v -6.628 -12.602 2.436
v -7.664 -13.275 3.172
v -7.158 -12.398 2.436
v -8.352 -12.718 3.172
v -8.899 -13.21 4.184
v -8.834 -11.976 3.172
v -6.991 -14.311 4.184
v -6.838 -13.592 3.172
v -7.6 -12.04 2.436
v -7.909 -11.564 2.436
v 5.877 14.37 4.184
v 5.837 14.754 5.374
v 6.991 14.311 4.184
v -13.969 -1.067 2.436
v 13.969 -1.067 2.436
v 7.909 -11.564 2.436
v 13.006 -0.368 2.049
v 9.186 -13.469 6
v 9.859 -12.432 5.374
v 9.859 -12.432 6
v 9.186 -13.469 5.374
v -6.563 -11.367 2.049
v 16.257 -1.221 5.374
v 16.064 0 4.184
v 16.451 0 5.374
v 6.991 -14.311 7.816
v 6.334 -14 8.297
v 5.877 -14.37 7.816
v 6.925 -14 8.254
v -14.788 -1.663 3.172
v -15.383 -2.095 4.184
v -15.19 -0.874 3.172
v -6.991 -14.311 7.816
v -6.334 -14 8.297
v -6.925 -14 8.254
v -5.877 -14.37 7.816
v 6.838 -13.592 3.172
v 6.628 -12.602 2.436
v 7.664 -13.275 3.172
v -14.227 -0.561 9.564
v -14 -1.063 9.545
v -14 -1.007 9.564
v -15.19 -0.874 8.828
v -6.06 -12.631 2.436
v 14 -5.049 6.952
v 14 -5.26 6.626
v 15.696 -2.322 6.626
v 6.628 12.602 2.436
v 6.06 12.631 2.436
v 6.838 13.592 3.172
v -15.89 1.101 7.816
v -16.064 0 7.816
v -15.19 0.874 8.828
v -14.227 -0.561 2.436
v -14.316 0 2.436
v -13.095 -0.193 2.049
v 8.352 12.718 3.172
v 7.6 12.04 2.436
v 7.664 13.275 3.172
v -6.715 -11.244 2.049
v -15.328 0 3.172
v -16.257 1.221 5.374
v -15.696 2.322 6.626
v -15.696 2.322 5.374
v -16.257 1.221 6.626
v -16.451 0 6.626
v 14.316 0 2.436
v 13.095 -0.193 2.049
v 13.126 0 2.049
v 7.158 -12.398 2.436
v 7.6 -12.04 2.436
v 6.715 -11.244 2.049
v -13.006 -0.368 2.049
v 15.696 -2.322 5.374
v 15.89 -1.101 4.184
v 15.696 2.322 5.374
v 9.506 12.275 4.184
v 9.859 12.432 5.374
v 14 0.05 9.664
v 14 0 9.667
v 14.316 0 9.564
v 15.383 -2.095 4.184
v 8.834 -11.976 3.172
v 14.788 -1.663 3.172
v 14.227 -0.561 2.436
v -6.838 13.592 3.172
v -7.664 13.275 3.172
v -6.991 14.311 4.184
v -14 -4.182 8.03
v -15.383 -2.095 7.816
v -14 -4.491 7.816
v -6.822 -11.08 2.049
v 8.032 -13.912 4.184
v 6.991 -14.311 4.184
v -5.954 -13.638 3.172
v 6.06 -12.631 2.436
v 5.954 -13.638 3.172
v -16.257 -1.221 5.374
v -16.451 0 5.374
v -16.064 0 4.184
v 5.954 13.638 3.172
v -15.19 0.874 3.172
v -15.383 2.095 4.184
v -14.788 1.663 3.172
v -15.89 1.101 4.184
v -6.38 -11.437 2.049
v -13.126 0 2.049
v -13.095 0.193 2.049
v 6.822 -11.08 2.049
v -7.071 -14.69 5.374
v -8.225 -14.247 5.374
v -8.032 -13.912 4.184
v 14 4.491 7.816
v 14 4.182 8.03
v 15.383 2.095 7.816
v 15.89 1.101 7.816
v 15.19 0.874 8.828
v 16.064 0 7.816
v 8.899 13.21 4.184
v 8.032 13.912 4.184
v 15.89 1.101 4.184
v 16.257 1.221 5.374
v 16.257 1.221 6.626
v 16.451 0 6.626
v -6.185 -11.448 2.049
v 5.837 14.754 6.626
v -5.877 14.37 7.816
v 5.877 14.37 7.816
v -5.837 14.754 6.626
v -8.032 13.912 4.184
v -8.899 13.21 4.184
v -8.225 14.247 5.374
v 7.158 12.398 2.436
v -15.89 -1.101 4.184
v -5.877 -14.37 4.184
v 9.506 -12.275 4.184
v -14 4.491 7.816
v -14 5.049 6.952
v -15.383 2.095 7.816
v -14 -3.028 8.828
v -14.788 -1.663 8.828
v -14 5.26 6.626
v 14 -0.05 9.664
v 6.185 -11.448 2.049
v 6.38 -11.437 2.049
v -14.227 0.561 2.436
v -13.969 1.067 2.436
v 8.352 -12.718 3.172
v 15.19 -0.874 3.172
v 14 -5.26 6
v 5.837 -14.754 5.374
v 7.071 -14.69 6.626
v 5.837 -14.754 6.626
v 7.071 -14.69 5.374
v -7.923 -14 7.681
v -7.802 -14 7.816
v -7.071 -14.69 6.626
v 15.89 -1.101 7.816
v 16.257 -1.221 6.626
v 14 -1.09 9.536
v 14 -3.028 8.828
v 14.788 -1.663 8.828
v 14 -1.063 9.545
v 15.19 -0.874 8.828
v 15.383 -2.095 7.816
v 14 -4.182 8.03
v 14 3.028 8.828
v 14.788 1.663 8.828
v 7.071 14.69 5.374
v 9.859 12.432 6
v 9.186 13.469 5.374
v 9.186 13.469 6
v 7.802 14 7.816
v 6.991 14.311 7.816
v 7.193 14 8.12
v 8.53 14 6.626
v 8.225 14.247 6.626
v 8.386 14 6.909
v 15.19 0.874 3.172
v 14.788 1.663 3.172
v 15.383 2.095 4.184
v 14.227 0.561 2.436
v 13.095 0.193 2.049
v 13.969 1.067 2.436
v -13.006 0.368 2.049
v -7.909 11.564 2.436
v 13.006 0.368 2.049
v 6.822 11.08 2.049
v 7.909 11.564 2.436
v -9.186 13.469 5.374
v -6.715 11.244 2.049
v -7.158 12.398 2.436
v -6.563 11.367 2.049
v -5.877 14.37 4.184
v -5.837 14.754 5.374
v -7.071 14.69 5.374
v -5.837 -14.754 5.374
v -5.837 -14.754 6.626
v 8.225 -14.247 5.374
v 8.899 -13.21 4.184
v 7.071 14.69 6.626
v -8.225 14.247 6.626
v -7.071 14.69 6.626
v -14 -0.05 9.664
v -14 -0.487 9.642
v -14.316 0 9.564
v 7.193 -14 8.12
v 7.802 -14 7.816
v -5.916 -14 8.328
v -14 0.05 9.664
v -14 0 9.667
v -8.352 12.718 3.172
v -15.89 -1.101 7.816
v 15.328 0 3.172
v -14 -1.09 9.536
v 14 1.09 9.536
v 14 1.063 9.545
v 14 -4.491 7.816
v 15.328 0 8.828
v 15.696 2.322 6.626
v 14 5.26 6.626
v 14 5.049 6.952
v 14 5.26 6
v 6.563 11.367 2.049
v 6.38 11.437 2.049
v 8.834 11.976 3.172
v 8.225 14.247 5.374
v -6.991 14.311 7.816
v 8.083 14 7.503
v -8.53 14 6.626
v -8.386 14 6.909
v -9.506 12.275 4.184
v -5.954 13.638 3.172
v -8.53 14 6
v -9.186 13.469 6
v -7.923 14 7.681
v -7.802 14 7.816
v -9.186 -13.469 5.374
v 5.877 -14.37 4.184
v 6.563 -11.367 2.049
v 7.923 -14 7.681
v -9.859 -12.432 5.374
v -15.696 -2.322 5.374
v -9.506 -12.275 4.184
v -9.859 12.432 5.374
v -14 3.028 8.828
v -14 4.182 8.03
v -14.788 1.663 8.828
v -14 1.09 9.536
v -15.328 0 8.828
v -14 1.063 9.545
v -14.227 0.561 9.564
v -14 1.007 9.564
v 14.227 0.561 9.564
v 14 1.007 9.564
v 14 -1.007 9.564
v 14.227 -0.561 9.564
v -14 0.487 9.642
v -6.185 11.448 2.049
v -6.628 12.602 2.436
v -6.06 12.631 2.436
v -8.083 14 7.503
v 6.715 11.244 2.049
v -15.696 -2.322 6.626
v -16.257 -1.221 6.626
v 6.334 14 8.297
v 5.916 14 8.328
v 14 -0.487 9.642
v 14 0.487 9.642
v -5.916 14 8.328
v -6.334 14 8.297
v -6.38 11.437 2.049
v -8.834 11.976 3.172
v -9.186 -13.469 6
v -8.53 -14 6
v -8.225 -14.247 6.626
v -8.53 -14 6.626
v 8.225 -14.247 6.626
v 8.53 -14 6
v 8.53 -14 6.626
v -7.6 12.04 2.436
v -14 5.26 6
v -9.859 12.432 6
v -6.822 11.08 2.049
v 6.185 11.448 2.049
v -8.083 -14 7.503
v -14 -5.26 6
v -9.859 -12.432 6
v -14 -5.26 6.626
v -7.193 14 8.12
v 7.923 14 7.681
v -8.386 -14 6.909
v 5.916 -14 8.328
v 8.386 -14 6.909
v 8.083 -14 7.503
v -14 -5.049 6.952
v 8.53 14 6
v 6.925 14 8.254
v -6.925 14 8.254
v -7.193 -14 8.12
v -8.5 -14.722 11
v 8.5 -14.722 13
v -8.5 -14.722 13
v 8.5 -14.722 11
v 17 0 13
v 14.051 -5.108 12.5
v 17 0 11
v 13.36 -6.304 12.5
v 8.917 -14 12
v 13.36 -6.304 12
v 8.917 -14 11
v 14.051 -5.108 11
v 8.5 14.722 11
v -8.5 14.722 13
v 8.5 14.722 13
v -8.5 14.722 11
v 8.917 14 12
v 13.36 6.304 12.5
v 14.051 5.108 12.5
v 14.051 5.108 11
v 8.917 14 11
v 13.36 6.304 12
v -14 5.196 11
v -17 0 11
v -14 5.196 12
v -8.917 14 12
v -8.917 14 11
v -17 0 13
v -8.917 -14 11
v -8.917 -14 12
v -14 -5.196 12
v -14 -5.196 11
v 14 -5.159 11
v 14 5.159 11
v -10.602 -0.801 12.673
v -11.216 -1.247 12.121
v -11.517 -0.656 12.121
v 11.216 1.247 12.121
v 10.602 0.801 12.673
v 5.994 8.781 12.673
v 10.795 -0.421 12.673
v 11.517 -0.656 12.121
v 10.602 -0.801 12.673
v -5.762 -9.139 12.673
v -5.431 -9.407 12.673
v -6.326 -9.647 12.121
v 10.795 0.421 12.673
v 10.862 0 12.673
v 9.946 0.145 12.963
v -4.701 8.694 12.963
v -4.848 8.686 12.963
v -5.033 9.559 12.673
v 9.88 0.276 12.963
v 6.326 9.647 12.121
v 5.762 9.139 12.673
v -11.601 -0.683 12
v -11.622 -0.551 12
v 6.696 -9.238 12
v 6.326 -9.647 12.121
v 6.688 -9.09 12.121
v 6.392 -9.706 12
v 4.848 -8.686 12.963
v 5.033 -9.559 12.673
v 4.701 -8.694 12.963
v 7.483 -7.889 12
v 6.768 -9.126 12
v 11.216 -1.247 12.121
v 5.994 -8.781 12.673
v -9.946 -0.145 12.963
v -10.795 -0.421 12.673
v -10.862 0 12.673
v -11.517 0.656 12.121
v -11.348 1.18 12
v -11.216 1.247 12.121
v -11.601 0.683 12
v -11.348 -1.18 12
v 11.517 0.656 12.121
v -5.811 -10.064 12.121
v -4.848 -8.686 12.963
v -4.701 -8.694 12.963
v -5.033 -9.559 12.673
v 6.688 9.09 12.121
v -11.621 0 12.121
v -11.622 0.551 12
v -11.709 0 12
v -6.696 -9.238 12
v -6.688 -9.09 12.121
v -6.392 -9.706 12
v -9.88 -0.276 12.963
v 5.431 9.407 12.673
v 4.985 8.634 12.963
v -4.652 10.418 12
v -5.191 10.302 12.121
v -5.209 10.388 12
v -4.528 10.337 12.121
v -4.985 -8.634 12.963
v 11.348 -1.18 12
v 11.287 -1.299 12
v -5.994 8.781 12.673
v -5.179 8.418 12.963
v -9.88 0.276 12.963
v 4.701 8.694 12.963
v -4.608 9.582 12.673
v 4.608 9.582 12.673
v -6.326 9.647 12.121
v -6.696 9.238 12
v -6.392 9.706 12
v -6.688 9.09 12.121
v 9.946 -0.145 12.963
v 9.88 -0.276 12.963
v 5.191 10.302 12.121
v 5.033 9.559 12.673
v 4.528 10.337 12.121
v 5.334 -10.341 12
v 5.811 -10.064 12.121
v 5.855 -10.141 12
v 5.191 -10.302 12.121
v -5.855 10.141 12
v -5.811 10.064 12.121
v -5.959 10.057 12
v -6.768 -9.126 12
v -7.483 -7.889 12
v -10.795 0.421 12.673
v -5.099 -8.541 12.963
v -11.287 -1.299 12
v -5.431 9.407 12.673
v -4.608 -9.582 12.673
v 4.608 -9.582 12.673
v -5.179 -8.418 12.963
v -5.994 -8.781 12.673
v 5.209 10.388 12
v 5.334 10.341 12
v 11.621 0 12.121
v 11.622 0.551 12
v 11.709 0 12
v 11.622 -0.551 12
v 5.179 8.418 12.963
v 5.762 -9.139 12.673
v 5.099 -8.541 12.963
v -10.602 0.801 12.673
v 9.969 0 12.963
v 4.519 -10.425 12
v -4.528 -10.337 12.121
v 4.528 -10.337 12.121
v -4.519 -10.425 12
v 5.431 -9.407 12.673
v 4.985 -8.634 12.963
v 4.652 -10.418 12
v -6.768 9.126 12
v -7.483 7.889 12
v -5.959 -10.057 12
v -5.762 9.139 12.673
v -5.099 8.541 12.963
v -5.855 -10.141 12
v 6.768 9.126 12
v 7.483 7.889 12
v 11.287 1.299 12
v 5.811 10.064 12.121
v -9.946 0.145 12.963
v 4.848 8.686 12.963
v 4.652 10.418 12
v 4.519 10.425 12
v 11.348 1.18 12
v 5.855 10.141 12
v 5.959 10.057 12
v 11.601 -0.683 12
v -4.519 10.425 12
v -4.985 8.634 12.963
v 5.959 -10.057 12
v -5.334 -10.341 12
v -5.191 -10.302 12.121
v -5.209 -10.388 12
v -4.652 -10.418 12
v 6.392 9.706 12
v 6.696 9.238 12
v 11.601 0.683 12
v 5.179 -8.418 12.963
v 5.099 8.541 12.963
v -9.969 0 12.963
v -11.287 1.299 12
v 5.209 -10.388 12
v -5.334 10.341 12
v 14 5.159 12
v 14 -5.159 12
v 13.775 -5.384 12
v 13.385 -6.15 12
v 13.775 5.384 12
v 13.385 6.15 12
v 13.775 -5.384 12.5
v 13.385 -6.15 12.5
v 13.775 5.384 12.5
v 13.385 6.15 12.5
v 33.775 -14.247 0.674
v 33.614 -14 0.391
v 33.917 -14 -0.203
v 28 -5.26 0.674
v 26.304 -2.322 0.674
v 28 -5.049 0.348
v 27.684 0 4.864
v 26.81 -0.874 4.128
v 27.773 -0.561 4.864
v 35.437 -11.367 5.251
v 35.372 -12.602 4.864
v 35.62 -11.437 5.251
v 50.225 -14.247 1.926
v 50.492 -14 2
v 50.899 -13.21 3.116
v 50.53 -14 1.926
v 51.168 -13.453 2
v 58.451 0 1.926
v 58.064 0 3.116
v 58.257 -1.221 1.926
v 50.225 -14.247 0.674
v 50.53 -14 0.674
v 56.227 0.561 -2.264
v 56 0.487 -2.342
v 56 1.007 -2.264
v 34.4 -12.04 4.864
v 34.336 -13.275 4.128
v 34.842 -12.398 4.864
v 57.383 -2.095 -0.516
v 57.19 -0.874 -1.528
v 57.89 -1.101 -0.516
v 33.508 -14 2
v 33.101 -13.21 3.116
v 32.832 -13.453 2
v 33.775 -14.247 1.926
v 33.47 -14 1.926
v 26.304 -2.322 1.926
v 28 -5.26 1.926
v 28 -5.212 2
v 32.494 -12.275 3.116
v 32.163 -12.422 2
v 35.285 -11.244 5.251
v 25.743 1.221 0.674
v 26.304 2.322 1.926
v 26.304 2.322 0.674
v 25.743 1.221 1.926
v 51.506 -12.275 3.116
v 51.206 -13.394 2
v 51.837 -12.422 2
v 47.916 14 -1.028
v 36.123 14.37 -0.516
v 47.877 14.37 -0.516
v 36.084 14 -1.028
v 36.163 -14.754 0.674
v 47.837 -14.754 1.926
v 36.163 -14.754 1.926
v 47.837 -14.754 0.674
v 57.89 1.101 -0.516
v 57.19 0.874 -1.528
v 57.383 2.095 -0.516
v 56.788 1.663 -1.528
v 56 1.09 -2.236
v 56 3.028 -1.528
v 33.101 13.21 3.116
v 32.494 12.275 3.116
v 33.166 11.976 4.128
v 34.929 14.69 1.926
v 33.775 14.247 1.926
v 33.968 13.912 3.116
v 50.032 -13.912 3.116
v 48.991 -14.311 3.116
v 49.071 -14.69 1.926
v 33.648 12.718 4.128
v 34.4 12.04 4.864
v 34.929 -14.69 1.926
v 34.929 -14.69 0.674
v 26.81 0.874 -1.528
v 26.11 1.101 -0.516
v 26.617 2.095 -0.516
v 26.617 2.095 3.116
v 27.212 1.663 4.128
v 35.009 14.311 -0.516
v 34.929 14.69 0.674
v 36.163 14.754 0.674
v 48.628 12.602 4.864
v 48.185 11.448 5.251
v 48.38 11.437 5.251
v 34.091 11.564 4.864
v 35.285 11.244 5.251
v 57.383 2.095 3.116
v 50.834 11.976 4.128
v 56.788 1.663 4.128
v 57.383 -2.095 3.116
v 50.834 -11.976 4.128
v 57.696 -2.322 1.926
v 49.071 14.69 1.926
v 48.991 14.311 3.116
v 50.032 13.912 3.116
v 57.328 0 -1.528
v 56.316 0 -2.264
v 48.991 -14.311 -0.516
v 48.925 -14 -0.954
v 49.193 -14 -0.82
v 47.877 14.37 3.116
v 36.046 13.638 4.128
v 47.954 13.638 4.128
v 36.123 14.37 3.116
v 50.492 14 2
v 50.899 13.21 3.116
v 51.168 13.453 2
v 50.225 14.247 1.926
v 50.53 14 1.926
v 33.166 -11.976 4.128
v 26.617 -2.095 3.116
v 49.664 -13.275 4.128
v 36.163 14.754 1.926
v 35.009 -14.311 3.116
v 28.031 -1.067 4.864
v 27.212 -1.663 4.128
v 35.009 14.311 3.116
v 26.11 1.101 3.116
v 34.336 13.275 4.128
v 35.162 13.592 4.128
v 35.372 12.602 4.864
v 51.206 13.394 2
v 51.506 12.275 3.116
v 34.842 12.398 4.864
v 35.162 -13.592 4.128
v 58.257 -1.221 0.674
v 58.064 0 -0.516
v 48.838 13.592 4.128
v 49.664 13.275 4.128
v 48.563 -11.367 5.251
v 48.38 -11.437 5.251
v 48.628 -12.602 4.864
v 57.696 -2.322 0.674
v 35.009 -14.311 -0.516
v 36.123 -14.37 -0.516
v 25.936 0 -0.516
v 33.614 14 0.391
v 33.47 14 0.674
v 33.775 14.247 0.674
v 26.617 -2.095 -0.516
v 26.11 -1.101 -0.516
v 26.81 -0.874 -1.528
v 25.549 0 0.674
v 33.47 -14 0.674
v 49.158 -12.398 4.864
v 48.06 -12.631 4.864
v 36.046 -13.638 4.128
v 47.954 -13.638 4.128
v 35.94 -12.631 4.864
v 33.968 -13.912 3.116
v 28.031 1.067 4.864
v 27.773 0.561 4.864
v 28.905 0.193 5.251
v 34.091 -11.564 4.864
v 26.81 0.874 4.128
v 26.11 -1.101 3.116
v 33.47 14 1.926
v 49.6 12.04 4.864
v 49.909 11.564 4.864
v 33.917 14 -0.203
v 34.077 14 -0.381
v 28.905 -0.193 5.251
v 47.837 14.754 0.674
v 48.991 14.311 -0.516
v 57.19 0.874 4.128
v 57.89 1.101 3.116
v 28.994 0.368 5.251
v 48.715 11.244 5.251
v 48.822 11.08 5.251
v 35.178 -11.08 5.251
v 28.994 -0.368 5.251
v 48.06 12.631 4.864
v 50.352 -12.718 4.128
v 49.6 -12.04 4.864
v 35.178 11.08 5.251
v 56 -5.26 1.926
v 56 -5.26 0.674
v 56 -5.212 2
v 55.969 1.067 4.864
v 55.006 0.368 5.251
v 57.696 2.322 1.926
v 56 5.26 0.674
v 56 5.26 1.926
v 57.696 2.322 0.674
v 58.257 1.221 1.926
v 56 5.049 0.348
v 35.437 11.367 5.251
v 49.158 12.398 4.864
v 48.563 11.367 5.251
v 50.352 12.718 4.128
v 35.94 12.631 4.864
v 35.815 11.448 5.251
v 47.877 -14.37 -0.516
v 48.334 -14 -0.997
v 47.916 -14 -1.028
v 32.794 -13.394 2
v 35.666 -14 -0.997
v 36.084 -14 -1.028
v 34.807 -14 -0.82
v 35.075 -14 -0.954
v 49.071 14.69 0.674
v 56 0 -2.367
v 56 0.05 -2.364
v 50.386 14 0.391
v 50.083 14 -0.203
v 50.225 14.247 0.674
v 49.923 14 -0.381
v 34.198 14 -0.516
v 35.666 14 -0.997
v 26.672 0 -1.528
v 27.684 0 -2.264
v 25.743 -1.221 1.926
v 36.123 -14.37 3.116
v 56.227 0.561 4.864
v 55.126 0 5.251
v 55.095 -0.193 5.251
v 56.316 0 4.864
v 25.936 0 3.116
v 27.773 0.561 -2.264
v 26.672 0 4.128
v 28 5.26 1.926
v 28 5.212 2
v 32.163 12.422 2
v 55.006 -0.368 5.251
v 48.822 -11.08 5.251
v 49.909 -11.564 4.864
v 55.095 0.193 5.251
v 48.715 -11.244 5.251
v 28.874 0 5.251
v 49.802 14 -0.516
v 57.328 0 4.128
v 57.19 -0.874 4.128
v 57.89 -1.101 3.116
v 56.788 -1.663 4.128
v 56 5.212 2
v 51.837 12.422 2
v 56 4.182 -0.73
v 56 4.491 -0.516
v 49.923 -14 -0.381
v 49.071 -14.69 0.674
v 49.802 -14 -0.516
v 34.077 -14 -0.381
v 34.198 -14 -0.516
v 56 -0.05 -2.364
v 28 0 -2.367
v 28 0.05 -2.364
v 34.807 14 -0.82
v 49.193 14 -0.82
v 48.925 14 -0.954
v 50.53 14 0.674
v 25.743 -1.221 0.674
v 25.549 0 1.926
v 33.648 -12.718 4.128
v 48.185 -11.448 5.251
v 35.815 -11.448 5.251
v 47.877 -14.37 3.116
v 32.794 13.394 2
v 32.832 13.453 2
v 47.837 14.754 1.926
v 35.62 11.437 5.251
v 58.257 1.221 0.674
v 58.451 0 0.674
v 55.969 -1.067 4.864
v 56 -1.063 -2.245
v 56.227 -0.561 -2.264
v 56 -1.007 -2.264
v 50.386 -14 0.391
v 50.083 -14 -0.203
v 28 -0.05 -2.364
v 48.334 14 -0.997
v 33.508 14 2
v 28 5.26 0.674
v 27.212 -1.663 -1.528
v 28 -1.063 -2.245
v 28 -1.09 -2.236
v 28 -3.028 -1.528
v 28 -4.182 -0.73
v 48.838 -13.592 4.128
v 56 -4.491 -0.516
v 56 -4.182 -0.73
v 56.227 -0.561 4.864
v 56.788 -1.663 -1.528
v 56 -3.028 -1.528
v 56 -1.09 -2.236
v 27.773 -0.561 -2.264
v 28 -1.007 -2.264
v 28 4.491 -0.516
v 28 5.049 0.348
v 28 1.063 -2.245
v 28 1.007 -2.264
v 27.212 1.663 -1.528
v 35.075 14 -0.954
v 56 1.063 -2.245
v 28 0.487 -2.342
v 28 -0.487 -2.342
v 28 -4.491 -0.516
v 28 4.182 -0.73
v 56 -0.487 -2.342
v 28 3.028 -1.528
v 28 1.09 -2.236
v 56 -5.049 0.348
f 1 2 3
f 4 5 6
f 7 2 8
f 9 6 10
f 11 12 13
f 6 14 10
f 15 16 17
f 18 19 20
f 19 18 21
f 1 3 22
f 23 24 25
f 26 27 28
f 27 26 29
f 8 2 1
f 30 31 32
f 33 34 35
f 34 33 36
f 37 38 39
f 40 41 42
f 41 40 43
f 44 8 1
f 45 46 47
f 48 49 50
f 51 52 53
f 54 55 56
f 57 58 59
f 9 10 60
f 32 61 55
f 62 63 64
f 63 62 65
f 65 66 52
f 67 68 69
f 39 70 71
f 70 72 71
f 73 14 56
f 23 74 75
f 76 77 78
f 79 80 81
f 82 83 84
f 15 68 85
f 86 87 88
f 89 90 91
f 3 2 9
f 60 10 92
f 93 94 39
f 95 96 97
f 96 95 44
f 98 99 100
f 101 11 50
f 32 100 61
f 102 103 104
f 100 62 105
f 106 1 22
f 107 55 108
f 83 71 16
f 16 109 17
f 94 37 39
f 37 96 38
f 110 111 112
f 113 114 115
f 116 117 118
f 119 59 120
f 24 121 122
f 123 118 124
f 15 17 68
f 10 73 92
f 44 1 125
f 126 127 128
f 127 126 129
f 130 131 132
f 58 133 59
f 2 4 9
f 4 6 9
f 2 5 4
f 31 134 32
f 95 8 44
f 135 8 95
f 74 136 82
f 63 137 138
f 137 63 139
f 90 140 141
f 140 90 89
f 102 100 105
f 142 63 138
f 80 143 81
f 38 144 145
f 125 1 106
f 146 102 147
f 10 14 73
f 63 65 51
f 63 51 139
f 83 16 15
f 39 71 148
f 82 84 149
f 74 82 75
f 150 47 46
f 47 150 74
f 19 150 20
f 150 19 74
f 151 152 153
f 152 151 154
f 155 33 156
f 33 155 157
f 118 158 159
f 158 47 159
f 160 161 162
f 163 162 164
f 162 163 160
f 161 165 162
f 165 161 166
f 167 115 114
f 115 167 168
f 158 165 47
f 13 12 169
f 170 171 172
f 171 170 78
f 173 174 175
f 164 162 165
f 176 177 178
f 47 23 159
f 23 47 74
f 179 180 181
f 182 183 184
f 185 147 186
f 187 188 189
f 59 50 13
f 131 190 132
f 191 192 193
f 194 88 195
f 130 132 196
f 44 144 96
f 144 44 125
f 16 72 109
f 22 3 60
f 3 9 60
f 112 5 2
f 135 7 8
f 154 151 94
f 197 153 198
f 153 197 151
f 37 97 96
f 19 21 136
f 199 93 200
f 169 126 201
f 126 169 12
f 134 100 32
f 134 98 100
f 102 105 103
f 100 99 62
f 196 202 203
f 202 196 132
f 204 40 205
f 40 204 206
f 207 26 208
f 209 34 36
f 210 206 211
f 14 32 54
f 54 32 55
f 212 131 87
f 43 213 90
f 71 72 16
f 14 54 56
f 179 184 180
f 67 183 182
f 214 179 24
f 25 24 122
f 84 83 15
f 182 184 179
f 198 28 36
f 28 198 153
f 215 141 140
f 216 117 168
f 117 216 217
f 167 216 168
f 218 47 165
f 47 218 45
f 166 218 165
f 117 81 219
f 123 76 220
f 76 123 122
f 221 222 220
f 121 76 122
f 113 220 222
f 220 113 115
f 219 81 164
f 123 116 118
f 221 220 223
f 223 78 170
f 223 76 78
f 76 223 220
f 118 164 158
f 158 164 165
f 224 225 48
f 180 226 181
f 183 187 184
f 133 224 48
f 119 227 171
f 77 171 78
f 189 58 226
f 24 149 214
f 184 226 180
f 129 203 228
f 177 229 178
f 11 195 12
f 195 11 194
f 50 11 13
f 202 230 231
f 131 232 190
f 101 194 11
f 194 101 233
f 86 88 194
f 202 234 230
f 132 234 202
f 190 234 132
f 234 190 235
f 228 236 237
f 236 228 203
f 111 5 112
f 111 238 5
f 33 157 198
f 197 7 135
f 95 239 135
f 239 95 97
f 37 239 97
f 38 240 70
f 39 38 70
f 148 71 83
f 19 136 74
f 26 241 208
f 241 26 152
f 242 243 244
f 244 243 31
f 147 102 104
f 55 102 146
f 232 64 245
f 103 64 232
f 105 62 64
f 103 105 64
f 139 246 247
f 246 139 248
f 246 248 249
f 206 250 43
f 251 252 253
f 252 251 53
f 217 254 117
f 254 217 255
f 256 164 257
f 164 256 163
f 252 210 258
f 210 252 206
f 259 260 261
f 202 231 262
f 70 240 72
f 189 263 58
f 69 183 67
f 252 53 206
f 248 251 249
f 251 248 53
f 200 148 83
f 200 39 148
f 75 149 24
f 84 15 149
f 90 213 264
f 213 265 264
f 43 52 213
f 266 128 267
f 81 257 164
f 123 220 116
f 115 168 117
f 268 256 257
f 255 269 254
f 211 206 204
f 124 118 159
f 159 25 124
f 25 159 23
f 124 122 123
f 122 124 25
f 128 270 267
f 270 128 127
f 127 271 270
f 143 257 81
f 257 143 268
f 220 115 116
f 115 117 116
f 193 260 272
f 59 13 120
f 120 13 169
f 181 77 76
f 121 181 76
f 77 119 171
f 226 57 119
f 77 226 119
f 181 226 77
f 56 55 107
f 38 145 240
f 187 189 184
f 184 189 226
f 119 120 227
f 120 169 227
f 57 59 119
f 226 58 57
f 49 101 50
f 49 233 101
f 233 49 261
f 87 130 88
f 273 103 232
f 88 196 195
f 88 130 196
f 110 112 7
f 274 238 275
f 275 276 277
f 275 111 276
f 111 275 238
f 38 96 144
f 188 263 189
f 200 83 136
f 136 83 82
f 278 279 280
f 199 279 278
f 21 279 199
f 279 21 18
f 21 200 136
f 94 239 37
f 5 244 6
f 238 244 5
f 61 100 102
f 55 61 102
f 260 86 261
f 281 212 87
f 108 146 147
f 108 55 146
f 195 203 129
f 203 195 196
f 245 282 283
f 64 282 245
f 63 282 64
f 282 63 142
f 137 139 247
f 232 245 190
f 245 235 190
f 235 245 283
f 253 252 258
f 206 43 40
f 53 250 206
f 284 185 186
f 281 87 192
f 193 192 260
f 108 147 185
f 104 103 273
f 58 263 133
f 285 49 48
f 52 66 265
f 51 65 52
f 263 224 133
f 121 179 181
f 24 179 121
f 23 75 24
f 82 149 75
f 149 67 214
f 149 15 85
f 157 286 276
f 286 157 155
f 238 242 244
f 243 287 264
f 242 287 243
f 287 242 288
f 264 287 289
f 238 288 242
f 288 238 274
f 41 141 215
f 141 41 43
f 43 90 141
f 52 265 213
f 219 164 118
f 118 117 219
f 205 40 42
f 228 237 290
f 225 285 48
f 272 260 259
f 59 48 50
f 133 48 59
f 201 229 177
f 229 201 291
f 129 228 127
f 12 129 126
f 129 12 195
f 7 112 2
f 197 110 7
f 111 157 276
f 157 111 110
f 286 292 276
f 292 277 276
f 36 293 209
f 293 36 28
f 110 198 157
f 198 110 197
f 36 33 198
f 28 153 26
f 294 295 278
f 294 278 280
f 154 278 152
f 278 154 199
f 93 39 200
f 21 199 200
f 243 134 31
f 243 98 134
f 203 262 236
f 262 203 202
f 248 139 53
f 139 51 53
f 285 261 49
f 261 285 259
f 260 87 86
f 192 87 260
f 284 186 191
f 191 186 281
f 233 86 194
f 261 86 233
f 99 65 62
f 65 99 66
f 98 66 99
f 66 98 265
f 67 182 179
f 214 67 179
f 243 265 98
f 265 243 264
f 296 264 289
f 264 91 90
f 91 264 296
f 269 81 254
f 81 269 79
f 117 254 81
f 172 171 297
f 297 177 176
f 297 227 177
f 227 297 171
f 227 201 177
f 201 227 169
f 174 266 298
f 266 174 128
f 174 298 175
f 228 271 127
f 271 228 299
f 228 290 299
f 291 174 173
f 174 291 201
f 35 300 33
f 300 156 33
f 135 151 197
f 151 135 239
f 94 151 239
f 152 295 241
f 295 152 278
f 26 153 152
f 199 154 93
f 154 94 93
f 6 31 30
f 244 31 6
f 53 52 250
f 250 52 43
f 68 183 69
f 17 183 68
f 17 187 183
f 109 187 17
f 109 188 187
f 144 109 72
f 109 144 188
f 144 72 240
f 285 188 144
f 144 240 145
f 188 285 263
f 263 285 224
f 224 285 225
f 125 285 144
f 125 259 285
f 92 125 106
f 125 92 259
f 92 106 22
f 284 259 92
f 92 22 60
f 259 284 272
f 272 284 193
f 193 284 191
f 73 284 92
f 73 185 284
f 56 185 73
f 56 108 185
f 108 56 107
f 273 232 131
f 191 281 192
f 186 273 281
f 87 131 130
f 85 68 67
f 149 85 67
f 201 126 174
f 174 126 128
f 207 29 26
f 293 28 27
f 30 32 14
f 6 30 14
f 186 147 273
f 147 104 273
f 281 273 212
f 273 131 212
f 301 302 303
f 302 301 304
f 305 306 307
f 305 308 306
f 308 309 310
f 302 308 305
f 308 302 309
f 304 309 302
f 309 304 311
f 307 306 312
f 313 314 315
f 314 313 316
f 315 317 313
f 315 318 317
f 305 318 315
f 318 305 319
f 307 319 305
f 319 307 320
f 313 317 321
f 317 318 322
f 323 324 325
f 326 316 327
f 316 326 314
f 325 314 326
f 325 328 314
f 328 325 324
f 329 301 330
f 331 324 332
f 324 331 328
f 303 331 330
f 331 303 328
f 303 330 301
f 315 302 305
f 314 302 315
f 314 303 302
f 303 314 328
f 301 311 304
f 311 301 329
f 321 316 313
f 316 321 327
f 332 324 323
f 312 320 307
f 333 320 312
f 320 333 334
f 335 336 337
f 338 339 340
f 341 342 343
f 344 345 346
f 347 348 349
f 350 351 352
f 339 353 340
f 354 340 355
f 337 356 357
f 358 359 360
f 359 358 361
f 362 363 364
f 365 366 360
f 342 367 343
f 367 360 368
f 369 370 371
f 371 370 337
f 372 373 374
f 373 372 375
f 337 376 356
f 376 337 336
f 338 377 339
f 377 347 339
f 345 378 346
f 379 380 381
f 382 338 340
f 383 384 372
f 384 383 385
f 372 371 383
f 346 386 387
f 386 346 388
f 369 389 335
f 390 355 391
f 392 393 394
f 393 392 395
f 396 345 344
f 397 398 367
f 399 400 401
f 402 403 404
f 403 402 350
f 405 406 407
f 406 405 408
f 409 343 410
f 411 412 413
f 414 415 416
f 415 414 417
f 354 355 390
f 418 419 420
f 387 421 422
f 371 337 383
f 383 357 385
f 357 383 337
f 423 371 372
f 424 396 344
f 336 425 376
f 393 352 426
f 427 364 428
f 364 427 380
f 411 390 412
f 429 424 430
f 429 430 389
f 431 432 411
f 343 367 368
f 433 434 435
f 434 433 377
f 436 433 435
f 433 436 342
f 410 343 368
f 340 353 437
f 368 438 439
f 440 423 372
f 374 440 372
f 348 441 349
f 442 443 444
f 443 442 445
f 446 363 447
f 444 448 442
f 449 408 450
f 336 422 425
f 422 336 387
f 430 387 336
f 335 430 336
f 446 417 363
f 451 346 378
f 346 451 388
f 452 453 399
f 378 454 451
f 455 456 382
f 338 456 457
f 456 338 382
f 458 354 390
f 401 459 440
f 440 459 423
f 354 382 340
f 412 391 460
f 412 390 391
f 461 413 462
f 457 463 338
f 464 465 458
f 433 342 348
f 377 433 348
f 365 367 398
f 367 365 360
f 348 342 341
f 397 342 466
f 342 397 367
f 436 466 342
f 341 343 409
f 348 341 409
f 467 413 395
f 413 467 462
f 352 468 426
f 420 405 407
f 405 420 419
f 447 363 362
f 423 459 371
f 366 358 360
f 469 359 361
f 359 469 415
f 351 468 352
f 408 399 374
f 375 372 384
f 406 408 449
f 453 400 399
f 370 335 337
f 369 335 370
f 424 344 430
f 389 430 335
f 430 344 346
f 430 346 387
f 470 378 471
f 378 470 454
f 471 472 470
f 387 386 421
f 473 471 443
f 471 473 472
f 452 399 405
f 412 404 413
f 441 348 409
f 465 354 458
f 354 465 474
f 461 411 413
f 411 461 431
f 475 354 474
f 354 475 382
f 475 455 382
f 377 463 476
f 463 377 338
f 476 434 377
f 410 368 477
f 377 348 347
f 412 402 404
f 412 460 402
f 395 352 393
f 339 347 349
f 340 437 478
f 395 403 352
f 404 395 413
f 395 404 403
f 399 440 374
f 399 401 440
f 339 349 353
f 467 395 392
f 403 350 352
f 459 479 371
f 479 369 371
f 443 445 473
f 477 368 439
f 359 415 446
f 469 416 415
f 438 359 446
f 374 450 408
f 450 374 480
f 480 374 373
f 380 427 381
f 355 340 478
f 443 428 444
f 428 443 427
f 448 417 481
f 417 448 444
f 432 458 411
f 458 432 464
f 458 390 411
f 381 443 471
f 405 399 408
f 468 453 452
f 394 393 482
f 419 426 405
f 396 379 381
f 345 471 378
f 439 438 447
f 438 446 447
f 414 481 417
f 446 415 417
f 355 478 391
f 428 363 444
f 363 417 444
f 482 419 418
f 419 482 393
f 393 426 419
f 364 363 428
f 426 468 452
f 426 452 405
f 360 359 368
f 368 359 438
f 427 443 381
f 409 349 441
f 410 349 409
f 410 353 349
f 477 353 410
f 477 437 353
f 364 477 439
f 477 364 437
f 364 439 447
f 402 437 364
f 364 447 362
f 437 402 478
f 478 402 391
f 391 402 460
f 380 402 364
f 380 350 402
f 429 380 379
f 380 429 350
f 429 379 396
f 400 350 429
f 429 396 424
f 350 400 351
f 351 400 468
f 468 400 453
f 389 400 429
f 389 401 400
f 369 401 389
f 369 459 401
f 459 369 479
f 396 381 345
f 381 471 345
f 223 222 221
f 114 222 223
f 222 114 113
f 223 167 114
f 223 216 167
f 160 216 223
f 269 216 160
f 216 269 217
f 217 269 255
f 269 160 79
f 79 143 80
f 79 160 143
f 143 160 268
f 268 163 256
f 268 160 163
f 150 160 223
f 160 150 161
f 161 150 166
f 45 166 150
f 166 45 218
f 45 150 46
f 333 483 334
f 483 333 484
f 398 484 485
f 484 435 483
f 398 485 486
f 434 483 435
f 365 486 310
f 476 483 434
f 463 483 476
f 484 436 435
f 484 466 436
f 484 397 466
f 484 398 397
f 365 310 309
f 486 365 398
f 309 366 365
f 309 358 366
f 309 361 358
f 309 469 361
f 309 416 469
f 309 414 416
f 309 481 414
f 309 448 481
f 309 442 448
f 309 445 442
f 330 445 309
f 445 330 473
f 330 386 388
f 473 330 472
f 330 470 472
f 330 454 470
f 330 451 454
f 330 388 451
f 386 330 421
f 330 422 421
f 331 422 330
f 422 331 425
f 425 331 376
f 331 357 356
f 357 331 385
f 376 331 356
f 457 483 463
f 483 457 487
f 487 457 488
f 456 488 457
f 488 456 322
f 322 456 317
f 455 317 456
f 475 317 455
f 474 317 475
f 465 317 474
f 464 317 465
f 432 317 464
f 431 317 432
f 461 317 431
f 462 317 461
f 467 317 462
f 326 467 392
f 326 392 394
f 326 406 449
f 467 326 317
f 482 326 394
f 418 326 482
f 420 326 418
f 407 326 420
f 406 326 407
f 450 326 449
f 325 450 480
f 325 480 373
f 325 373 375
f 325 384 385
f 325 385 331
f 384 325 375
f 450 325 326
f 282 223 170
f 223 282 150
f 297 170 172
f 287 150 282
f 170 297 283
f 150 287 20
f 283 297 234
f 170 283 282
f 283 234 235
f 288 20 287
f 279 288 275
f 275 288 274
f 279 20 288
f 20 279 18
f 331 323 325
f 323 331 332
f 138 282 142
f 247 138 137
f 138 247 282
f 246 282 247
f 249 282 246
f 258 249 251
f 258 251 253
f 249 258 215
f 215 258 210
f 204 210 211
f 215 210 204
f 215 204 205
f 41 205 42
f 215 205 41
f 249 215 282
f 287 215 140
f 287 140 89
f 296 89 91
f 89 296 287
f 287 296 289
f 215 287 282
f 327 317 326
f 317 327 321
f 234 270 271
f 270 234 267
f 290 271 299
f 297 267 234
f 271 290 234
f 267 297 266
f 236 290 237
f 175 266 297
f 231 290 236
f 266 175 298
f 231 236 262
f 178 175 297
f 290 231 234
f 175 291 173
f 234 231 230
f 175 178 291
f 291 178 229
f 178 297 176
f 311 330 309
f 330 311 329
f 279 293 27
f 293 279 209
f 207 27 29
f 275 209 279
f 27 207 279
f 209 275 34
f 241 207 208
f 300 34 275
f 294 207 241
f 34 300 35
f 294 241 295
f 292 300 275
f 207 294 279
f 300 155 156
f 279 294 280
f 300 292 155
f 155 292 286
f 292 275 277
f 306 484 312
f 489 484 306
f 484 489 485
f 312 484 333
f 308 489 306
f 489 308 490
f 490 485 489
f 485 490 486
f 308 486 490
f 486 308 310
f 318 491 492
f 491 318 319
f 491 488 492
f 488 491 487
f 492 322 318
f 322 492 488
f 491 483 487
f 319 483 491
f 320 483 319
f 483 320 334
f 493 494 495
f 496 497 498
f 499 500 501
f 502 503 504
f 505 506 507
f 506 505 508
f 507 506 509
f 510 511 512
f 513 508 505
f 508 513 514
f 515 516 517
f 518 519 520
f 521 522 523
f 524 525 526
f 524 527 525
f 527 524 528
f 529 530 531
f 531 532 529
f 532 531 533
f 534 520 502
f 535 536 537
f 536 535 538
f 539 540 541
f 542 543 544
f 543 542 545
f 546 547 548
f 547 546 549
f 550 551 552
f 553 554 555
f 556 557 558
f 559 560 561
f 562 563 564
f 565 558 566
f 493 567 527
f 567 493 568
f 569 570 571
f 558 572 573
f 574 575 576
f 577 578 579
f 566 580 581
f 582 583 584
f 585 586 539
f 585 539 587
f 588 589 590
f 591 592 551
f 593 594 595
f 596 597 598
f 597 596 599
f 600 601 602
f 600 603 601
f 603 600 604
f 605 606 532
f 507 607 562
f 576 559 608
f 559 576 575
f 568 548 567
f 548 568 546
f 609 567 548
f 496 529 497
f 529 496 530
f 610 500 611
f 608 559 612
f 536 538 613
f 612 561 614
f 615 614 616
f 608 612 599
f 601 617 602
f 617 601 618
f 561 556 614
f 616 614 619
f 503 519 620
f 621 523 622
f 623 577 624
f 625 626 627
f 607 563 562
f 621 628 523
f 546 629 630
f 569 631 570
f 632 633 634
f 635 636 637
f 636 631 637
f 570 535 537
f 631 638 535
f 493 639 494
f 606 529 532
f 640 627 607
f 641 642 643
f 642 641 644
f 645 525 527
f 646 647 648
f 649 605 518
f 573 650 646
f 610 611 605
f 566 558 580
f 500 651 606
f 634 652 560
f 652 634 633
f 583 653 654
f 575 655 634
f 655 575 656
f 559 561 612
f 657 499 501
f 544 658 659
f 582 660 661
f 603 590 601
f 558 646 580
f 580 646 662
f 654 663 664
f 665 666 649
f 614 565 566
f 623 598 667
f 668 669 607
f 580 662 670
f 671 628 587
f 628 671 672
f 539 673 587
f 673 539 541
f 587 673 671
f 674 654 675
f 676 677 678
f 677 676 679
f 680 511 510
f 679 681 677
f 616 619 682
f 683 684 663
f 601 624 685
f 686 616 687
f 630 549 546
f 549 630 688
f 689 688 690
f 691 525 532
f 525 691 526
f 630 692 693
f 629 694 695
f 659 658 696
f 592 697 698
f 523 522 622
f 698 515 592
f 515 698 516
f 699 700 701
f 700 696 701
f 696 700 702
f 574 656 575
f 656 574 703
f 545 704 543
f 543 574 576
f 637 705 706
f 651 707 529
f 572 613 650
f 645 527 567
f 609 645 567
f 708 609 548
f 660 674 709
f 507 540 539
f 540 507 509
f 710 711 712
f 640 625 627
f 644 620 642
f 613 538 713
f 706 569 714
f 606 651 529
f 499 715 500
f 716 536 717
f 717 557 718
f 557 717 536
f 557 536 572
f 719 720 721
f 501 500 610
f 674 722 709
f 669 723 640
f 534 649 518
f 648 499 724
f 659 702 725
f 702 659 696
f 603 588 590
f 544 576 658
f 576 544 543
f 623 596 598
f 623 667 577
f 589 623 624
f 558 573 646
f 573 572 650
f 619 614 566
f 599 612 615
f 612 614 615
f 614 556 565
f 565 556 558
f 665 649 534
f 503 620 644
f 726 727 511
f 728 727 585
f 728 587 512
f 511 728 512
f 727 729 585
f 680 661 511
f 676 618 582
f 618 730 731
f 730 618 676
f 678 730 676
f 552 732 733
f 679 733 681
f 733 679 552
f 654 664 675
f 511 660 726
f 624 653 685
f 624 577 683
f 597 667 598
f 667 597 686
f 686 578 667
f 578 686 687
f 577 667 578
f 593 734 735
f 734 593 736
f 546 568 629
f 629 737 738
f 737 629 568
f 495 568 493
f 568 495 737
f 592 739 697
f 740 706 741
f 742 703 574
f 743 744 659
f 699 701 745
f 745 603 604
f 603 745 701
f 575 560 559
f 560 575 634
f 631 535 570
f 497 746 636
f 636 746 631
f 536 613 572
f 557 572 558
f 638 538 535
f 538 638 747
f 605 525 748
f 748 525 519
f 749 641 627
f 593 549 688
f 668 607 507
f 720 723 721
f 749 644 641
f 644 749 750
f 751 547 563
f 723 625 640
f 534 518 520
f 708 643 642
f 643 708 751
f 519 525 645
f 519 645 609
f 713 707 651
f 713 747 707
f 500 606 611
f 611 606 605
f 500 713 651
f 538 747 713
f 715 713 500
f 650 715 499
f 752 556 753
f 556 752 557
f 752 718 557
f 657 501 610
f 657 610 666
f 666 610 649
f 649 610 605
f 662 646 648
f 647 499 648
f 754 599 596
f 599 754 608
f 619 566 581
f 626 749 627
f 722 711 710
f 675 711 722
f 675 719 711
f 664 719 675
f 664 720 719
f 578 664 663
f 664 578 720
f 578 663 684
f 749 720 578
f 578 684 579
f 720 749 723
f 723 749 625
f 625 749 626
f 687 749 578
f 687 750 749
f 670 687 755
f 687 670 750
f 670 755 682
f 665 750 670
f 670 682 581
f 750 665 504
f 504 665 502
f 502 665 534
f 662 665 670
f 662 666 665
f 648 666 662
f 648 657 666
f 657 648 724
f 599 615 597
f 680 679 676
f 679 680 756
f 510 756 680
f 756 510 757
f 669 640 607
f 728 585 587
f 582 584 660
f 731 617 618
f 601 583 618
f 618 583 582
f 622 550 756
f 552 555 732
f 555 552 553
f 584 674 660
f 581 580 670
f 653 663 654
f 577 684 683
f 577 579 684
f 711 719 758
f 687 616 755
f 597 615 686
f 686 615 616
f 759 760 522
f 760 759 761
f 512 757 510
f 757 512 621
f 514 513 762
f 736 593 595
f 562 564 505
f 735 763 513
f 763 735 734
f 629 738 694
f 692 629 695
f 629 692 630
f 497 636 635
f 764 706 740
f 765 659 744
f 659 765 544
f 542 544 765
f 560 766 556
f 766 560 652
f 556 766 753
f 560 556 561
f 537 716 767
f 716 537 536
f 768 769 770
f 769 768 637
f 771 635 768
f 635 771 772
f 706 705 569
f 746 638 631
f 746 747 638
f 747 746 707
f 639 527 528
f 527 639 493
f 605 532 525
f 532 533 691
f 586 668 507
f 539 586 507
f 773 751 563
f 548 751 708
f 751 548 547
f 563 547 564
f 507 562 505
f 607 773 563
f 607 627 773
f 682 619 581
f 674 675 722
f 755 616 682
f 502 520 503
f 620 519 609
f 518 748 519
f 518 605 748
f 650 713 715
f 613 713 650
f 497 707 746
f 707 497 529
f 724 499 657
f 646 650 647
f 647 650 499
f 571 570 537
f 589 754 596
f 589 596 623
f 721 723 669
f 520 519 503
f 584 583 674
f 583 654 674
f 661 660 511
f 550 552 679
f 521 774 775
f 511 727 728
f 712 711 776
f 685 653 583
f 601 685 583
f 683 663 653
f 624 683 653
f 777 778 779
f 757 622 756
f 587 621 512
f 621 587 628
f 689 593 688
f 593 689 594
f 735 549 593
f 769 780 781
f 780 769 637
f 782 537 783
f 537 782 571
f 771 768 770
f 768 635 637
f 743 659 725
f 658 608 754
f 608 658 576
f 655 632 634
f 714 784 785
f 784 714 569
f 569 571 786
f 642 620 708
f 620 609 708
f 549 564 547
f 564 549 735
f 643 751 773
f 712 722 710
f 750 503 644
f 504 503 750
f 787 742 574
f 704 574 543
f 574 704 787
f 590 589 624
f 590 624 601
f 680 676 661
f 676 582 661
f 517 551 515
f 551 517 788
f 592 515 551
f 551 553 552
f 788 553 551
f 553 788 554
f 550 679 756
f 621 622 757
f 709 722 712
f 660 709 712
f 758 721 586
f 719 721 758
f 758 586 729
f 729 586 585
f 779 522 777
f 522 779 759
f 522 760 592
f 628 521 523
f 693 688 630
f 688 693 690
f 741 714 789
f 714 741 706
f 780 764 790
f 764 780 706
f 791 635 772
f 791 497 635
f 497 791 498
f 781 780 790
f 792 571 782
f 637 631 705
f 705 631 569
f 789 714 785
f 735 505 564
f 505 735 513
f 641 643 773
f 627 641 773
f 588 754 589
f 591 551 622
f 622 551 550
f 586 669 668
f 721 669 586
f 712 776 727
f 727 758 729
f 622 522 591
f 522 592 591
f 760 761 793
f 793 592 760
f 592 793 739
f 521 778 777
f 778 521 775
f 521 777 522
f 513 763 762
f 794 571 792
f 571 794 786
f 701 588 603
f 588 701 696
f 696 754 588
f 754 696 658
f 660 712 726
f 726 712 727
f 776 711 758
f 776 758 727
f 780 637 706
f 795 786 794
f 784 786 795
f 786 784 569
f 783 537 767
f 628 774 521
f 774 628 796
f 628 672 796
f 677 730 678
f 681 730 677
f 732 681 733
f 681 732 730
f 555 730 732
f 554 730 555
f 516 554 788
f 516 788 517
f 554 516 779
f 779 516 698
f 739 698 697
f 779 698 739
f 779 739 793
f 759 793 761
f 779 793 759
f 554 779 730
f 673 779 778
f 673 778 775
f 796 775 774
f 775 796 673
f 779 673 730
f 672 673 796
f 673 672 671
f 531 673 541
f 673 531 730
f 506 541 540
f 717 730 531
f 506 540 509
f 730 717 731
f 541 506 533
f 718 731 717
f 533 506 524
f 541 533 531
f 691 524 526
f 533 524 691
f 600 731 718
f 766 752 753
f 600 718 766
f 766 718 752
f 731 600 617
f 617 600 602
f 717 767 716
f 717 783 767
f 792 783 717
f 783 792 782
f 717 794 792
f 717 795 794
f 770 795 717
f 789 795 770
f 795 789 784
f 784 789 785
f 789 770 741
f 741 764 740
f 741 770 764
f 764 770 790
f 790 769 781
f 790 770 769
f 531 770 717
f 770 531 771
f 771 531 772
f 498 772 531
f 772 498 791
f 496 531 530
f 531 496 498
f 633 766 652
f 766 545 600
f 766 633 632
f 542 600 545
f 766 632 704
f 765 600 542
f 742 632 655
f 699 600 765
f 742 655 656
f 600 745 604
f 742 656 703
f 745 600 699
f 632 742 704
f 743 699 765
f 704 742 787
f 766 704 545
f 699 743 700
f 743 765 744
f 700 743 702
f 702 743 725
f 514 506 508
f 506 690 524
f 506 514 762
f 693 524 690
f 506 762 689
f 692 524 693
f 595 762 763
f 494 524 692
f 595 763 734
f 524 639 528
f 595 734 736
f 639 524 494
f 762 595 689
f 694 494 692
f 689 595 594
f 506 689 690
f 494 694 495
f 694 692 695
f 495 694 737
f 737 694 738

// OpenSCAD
// Cyclops XIAO — V3 "Gem"
// Faceted jewel pendant: soft hexagonal prism with chamfered edges and a
// faceted bezel around the screen. Premium, angular-but-smooth.
//
// Render: openscad cyclops_xiao_v3_gem.scad
// Export: openscad -D 'PART="body"' -o v3_body.stl cyclops_xiao_v3_gem.scad

xiao_l = 21.0; xiao_w = 17.5; wall = 2.0;
base_h = 6.0; body_h = 12.0;
win_w = 28.0; win_h = 28.0;
$fn = 6;   // hexagonal facet feel

module hex_plate(l,w,h,r=3){
  // rounded hexagon prism
  hull(){
    for(a=[0:60:300])
      rotate([0,0,a]) translate([l/2-r,0,h/2]) sphere(r=r,$fn=20);
    for(a=[0:60:300])
      rotate([0,0,a+30]) translate([0,w/2-r,h/2]) sphere(r=r,$fn=20);
  }
}

module body(){
  difference(){
    union(){
      hex_plate(xiao_l+2*wall+8, xiao_w+2*wall+10, body_h, 4);
      // crown facets on top rim
      translate([0,0,body_h-1])
        cylinder(d=34, h=2, $fn=6);
    }
    translate([0,0,base_h]) hex_plate(xiao_l+2*wall, xiao_w+2*wall, body_h-base_h+2, 3);
    // screen window (top) with faceted bezel
    translate([0,0,body_h-3]) cube([win_w, win_h, 6], center=true);
    // bezel ring (raised lip around window)
    // USB-C at one hex flat
    translate([-19,0,base_h+1]) cube([5,11,7], center=true);
    // buttons on adjacent flats
    translate([16,-7,body_h-2]) cylinder(d=5.5,h=5,$fn=20,center=true);
    translate([16, 7,body_h-2]) cylinder(d=5.5,h=5,$fn=20,center=true);
    translate([0, 18,body_h-2]) cylinder(d=5.5,h=5,$fn=20,center=true);
    // pendant bail (top loop)
    translate([0,-20,body_h/2]) rotate([90,0,0]) torus_bail();
  }
}
module torus_bail(){
  rotate_extrude(convexity=4)
    translate([5,0,0]) circle(r=2.8,$fn=20);
}

module lid(){
  difference(){
    hex_plate(xiao_l+2*wall+8, xiao_w+2*wall+10, 2.6, 4);
    translate([0,0,-1]) cube([win_w, win_h, 6], center=true);
  }
}

PART = undef;
if (!is_undef(PART) && PART=="body") body();
else if (!is_undef(PART) && PART=="lid") lid();
else { body(); translate([42,0,0]) lid(); }
